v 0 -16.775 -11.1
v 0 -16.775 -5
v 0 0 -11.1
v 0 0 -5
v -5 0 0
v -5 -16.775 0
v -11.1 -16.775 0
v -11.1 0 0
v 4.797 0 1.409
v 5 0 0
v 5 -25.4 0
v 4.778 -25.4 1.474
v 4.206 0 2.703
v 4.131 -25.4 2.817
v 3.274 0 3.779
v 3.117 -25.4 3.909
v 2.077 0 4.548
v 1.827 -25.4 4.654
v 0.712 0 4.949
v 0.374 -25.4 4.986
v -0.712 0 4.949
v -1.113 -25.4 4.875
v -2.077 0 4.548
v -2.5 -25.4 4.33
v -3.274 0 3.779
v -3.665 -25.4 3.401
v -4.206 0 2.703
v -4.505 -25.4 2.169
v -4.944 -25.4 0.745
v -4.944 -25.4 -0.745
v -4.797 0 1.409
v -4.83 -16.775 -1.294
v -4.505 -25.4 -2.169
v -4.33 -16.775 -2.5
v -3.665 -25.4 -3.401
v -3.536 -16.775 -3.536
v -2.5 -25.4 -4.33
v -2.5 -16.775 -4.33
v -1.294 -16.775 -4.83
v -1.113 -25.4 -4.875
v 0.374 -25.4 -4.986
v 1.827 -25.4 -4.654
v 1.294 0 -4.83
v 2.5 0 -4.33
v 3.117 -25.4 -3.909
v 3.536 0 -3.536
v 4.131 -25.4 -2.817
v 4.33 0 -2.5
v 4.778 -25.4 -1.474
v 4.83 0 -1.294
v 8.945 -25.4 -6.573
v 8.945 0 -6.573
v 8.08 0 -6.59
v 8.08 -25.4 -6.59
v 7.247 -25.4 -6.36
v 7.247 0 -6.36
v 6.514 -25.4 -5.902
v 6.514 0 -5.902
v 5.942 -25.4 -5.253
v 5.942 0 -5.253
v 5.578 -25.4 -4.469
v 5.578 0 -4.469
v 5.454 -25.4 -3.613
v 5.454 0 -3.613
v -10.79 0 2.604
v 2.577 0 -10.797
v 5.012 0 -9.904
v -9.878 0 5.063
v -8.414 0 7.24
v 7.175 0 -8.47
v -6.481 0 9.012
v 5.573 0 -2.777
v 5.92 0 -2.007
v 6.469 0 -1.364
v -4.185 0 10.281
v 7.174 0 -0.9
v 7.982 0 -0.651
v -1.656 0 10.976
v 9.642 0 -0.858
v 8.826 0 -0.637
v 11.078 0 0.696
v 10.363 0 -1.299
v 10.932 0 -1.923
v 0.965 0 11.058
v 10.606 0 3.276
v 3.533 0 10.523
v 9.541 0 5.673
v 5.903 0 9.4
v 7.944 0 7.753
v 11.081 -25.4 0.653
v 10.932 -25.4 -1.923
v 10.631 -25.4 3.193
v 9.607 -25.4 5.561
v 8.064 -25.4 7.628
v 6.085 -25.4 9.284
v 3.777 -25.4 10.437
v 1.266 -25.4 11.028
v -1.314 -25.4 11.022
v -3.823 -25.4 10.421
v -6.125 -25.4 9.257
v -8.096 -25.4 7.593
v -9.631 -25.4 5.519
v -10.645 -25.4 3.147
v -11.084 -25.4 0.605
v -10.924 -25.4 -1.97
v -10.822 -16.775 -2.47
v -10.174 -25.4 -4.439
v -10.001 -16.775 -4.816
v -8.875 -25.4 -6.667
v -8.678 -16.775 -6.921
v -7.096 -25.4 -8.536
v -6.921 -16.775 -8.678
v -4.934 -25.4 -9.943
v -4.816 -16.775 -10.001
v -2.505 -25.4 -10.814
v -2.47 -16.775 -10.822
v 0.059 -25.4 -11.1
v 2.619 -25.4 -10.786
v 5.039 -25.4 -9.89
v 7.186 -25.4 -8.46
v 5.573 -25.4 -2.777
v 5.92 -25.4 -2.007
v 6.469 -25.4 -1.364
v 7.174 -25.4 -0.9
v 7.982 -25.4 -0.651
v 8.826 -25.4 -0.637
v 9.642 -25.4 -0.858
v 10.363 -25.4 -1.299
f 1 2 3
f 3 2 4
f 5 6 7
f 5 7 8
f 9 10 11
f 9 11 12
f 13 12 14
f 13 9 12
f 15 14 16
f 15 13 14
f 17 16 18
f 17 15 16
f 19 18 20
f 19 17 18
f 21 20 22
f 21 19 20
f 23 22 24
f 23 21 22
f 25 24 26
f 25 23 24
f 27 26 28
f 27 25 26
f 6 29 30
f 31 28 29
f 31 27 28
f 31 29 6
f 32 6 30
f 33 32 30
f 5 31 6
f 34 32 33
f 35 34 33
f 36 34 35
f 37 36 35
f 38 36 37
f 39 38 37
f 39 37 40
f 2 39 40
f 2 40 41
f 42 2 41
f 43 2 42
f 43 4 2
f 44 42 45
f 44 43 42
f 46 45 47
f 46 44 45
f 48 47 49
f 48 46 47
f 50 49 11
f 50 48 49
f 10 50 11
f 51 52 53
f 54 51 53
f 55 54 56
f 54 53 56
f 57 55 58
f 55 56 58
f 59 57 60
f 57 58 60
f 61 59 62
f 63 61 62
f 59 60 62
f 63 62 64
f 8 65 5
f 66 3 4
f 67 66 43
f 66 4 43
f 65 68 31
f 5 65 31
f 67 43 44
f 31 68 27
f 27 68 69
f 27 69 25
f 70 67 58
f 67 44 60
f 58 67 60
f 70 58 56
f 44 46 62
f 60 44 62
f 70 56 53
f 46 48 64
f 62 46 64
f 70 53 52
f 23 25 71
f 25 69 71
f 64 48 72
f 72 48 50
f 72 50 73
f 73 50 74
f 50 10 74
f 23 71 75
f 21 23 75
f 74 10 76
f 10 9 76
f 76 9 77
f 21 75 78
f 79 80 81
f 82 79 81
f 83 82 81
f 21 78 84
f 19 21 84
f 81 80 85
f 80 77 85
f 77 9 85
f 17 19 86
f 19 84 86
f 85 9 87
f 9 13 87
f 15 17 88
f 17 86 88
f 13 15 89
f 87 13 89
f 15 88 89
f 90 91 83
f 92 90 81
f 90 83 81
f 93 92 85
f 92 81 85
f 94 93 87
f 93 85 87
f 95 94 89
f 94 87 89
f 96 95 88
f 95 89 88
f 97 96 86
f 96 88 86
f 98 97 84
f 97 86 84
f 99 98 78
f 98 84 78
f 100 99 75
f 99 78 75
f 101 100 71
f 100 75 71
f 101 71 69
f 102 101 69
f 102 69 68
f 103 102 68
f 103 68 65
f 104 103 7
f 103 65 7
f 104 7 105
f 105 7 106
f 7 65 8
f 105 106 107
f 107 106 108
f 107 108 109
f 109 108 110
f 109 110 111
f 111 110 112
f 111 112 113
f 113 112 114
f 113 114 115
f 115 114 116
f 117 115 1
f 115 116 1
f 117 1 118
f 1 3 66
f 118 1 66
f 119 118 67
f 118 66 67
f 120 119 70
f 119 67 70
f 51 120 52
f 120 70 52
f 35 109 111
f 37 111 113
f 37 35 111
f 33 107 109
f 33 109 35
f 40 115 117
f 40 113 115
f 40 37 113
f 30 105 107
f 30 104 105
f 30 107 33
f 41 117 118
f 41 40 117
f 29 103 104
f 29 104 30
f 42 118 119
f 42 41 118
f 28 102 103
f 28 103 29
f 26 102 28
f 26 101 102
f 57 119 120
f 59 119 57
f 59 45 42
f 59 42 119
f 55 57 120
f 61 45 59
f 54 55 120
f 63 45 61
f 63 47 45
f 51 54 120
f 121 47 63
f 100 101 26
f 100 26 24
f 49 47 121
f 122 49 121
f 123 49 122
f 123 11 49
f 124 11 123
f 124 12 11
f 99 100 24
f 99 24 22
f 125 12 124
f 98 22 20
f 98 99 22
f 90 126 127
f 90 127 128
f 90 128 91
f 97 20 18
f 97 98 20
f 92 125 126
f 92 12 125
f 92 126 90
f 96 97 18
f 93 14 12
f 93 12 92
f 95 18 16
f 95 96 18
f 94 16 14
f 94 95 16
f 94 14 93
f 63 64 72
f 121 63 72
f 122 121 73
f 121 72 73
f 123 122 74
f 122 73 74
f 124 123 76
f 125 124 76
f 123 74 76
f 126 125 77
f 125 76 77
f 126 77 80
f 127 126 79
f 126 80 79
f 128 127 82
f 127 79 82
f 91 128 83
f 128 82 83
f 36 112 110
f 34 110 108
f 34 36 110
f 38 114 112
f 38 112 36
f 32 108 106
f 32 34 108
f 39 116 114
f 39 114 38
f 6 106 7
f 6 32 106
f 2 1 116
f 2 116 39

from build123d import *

# Parameters (mm, degrees)
F0_R     = 11.1
F0_R_2   = 5
F1_DEPTH = 25.4
F2_W     = 16.7754087597
F2_H     = 27.2372085601
F3_DEPTH = 76.2
F5_DEPTH = 25.401


with BuildPart() as f1:
    # F0 (on Front) → F1 (new body)
    with BuildSketch(Plane.XZ):
        Circle(F0_R)
        Circle(F0_R_2, mode=Mode.SUBTRACT)
    extrude(amount=F1_DEPTH)

    # F2 (on Right) → F3 (cut)
    with BuildSketch(Plane.YZ):
        with Locations((-8.3877043799, -13.6186042801)):
            Rectangle(F2_W, F2_H)
    extrude(amount=-F3_DEPTH, mode=Mode.SUBTRACT)

    # F4 (on face) → F5 (cut, through all)
    with BuildSketch(Plane(origin=(0, 0, 0), x_dir=(-1, 0, 0), z_dir=(0, 1, 0))):
        with BuildLine():
            ThreePointArc((-8.9445990977, -6.572986154), (-6.5138225835, -5.901619973), (-5.4539214149, -3.6133856047))
            ThreePointArc((-5.4539214149, -3.6133856047), (-7.5692818154, -0.7467826013), (-10.9321966009, -1.9227785828))
            ThreePointArc((-10.9321966009, -1.9227785828), (-10.2067555778, -4.3625841625), (-8.9445990977, -6.572986154))
        make_face()
    extrude(amount=-F5_DEPTH, mode=Mode.SUBTRACT)


solid = f1.part
